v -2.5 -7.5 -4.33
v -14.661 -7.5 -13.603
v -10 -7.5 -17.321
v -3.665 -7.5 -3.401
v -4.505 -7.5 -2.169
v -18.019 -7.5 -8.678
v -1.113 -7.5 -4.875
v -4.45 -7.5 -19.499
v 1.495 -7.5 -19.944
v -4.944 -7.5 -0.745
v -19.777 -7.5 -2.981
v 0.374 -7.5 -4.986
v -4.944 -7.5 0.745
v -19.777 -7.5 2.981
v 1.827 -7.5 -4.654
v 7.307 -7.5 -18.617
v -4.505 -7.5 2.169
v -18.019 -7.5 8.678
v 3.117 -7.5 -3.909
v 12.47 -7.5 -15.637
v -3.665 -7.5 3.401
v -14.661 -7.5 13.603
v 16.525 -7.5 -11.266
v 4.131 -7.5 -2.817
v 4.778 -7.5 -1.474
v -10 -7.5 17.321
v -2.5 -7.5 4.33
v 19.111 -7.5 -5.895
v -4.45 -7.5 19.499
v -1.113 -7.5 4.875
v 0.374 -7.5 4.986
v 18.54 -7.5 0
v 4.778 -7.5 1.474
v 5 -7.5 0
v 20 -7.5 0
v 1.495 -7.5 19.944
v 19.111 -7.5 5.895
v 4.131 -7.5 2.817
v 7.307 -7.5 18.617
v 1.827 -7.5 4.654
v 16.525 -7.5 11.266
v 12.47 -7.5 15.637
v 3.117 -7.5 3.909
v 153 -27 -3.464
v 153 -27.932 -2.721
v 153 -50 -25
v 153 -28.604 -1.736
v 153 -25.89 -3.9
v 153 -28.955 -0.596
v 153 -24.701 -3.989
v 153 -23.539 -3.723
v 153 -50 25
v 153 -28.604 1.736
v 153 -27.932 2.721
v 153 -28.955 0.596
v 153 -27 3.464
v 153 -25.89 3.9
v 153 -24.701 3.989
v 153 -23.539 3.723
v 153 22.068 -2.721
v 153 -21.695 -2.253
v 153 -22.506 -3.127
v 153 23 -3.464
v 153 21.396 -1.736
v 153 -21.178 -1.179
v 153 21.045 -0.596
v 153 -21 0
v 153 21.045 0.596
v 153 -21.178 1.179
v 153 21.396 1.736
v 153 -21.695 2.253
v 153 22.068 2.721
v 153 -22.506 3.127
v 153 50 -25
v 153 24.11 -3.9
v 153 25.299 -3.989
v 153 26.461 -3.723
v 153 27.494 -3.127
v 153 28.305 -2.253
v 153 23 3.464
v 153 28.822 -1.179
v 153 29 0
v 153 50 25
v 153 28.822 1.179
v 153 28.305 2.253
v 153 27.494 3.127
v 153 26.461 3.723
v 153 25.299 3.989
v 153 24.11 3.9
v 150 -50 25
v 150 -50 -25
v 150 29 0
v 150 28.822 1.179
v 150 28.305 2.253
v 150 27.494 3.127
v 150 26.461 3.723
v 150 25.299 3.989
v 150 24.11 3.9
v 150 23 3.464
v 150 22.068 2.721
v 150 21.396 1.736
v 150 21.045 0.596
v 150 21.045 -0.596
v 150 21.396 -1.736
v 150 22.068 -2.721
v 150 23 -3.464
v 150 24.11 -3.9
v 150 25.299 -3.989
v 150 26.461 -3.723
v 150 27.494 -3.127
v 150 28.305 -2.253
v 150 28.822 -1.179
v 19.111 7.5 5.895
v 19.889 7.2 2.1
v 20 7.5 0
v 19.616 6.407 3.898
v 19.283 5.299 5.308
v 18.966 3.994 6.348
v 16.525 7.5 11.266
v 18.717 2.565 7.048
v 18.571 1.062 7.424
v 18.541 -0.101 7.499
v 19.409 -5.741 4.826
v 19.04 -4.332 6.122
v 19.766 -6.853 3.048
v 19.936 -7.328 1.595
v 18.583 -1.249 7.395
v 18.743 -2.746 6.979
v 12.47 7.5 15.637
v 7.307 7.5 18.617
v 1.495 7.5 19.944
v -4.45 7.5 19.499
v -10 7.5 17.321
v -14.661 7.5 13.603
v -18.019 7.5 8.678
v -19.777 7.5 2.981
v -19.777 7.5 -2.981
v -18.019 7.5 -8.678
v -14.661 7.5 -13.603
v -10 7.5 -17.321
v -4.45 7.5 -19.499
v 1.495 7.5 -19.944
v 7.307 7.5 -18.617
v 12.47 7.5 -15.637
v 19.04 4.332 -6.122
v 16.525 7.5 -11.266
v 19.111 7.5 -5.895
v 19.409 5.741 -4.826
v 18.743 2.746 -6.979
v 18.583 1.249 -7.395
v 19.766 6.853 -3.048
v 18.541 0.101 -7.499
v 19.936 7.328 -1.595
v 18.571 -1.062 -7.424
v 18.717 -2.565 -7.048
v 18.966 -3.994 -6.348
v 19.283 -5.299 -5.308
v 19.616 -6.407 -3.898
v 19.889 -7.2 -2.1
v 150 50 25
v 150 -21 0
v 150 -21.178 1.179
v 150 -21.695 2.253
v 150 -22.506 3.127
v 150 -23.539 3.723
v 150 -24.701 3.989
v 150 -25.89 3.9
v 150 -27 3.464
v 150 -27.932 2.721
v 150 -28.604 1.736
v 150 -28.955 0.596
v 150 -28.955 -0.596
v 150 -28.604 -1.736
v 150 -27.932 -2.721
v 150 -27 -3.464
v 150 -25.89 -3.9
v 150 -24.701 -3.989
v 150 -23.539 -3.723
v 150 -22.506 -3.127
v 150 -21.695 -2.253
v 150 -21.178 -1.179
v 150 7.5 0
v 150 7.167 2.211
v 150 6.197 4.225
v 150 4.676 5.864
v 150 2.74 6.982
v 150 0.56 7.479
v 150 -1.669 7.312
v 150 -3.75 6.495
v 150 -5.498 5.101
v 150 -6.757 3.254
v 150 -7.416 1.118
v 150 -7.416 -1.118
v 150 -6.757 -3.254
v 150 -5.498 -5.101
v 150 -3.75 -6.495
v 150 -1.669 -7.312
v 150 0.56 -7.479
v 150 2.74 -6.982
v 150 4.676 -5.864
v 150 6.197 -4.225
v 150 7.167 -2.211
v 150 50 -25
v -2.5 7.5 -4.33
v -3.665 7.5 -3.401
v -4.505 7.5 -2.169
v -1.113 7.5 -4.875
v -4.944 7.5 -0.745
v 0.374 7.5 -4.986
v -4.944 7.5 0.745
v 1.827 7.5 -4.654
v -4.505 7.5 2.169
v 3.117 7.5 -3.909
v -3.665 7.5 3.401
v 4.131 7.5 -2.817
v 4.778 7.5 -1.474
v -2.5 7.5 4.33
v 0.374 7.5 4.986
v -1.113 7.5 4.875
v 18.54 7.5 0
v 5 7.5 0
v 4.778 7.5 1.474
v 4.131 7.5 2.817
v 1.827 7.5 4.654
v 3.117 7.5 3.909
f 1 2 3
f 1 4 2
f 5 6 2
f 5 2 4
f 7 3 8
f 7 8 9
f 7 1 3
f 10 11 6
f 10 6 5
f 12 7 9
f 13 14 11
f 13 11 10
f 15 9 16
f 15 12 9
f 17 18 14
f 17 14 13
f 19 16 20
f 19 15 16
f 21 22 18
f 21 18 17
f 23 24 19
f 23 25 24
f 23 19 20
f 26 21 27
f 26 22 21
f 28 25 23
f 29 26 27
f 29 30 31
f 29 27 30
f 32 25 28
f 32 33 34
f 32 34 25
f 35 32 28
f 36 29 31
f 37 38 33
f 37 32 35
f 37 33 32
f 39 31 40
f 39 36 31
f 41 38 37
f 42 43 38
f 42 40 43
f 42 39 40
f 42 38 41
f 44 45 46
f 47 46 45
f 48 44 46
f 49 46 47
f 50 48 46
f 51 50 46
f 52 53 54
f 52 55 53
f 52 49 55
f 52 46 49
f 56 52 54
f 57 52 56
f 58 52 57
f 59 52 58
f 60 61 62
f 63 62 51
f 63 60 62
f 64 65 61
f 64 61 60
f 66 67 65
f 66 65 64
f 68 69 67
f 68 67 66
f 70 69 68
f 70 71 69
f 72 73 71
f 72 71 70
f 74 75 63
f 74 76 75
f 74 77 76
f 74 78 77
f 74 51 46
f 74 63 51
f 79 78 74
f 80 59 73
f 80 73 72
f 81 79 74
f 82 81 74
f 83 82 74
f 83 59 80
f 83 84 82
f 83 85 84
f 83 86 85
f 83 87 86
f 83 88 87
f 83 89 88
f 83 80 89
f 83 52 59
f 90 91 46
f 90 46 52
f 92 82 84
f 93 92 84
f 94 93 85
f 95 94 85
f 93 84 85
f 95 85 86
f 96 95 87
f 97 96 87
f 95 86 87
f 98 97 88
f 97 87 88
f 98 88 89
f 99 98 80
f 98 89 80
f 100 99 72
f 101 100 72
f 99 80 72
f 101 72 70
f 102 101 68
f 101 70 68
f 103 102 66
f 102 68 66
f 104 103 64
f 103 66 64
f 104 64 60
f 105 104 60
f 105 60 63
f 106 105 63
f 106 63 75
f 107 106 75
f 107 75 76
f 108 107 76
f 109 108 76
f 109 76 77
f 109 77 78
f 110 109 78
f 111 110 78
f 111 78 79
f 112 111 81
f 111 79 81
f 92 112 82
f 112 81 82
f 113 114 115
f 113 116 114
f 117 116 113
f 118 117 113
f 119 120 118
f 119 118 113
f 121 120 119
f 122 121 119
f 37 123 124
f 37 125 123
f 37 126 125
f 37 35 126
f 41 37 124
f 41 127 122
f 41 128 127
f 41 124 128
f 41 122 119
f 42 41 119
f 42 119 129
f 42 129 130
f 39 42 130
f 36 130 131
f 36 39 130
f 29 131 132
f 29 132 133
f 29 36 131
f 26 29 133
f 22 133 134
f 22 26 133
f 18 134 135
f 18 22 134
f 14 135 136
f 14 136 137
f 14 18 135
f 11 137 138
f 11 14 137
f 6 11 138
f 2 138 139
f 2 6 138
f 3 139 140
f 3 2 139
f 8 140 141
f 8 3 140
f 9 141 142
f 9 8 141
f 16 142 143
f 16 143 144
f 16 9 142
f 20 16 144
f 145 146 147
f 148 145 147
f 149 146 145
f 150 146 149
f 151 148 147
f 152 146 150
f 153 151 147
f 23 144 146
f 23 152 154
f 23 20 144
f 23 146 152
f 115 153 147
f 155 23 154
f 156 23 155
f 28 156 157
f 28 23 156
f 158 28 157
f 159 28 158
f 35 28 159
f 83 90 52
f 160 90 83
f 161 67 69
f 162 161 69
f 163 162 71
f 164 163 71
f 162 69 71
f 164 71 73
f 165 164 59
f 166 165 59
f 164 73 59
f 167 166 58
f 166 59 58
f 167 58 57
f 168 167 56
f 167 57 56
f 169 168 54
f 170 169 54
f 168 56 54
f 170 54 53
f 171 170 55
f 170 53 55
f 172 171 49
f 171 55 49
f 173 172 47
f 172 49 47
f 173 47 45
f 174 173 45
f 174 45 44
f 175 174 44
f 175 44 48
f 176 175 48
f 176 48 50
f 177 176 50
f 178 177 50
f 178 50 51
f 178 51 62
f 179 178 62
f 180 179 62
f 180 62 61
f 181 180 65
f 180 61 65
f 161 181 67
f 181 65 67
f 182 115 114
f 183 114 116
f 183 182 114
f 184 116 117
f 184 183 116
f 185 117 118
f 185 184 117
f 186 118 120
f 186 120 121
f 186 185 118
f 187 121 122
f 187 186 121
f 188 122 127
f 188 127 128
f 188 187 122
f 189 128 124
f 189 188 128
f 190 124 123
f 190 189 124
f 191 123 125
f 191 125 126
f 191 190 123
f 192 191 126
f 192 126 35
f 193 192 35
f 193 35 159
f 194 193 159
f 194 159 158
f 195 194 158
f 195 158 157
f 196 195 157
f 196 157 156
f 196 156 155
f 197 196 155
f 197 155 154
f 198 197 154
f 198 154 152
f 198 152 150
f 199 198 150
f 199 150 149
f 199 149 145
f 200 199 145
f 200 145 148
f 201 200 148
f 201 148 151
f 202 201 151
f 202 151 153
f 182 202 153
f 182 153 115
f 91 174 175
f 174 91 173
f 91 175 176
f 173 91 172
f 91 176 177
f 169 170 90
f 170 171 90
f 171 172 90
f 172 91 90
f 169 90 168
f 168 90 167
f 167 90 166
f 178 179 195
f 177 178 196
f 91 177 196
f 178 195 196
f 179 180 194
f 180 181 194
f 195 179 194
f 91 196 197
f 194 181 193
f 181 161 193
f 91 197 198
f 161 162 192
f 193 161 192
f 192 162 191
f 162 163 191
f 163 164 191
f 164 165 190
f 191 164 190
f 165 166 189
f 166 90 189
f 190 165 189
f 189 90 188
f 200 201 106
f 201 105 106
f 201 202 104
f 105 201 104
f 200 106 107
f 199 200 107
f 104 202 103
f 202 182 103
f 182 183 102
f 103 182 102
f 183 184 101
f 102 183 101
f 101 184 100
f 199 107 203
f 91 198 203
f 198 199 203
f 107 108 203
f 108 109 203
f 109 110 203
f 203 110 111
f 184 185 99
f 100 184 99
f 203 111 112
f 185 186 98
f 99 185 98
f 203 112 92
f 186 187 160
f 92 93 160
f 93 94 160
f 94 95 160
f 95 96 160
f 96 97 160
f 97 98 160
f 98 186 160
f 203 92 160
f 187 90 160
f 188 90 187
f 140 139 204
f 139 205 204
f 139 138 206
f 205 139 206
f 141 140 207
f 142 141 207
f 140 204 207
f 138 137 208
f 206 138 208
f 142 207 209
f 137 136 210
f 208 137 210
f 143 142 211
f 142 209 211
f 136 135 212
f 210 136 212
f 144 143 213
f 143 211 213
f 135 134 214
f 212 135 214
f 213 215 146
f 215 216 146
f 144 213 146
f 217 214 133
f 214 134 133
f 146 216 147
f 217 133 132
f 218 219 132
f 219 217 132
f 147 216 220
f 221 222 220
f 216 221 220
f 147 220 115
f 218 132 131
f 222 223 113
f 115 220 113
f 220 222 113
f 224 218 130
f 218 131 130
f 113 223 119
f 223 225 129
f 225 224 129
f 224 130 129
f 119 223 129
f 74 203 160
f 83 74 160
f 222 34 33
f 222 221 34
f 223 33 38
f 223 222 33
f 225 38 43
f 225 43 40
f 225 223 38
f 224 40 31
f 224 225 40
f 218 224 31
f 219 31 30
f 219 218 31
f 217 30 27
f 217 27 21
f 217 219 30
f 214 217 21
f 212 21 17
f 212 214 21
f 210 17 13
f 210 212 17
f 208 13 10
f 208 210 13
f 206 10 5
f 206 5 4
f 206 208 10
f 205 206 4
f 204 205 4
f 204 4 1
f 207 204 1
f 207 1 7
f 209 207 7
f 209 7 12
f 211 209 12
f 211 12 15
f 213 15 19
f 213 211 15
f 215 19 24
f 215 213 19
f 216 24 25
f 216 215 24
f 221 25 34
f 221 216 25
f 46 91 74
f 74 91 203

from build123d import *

# Parameters (mm, degrees)
F0_R     = 20
F0_R_2   = 5
F1_DEPTH = 7.5
F3_R     = 7.5
F4_DEPTH = 131.4595038823
F5_W     = 100
F5_H     = 50
F6_DEPTH = 3
F7_R     = 4
F8_DEPTH = 3


with BuildPart() as f1:
    # F0 (on Front) → F1 (new body, symmetric)
    with BuildSketch(Plane.XZ):
        Circle(F0_R)
        Circle(F0_R_2, mode=Mode.SUBTRACT)
    extrude(amount=F1_DEPTH, both=True)

    # F3 (on offset) → F4 (join, through all)
    with BuildSketch(Plane.YZ.offset(150)):
        Circle(F3_R)
    extrude(amount=-F4_DEPTH)

    # F5 (on offset) → F6 (join)
    with BuildSketch(Plane.YZ.offset(150)):
        Rectangle(F5_W, F5_H)
    extrude(amount=F6_DEPTH)

    # F7 (on face) → F8 (cut, through all)
    with BuildSketch(Plane.YZ.offset(153)):
        with Locations((-25, 0)):
            Circle(F7_R)
        with Locations((25, 0)):
            Circle(F7_R)
    extrude(amount=-F8_DEPTH, mode=Mode.SUBTRACT)


solid = f1.part
